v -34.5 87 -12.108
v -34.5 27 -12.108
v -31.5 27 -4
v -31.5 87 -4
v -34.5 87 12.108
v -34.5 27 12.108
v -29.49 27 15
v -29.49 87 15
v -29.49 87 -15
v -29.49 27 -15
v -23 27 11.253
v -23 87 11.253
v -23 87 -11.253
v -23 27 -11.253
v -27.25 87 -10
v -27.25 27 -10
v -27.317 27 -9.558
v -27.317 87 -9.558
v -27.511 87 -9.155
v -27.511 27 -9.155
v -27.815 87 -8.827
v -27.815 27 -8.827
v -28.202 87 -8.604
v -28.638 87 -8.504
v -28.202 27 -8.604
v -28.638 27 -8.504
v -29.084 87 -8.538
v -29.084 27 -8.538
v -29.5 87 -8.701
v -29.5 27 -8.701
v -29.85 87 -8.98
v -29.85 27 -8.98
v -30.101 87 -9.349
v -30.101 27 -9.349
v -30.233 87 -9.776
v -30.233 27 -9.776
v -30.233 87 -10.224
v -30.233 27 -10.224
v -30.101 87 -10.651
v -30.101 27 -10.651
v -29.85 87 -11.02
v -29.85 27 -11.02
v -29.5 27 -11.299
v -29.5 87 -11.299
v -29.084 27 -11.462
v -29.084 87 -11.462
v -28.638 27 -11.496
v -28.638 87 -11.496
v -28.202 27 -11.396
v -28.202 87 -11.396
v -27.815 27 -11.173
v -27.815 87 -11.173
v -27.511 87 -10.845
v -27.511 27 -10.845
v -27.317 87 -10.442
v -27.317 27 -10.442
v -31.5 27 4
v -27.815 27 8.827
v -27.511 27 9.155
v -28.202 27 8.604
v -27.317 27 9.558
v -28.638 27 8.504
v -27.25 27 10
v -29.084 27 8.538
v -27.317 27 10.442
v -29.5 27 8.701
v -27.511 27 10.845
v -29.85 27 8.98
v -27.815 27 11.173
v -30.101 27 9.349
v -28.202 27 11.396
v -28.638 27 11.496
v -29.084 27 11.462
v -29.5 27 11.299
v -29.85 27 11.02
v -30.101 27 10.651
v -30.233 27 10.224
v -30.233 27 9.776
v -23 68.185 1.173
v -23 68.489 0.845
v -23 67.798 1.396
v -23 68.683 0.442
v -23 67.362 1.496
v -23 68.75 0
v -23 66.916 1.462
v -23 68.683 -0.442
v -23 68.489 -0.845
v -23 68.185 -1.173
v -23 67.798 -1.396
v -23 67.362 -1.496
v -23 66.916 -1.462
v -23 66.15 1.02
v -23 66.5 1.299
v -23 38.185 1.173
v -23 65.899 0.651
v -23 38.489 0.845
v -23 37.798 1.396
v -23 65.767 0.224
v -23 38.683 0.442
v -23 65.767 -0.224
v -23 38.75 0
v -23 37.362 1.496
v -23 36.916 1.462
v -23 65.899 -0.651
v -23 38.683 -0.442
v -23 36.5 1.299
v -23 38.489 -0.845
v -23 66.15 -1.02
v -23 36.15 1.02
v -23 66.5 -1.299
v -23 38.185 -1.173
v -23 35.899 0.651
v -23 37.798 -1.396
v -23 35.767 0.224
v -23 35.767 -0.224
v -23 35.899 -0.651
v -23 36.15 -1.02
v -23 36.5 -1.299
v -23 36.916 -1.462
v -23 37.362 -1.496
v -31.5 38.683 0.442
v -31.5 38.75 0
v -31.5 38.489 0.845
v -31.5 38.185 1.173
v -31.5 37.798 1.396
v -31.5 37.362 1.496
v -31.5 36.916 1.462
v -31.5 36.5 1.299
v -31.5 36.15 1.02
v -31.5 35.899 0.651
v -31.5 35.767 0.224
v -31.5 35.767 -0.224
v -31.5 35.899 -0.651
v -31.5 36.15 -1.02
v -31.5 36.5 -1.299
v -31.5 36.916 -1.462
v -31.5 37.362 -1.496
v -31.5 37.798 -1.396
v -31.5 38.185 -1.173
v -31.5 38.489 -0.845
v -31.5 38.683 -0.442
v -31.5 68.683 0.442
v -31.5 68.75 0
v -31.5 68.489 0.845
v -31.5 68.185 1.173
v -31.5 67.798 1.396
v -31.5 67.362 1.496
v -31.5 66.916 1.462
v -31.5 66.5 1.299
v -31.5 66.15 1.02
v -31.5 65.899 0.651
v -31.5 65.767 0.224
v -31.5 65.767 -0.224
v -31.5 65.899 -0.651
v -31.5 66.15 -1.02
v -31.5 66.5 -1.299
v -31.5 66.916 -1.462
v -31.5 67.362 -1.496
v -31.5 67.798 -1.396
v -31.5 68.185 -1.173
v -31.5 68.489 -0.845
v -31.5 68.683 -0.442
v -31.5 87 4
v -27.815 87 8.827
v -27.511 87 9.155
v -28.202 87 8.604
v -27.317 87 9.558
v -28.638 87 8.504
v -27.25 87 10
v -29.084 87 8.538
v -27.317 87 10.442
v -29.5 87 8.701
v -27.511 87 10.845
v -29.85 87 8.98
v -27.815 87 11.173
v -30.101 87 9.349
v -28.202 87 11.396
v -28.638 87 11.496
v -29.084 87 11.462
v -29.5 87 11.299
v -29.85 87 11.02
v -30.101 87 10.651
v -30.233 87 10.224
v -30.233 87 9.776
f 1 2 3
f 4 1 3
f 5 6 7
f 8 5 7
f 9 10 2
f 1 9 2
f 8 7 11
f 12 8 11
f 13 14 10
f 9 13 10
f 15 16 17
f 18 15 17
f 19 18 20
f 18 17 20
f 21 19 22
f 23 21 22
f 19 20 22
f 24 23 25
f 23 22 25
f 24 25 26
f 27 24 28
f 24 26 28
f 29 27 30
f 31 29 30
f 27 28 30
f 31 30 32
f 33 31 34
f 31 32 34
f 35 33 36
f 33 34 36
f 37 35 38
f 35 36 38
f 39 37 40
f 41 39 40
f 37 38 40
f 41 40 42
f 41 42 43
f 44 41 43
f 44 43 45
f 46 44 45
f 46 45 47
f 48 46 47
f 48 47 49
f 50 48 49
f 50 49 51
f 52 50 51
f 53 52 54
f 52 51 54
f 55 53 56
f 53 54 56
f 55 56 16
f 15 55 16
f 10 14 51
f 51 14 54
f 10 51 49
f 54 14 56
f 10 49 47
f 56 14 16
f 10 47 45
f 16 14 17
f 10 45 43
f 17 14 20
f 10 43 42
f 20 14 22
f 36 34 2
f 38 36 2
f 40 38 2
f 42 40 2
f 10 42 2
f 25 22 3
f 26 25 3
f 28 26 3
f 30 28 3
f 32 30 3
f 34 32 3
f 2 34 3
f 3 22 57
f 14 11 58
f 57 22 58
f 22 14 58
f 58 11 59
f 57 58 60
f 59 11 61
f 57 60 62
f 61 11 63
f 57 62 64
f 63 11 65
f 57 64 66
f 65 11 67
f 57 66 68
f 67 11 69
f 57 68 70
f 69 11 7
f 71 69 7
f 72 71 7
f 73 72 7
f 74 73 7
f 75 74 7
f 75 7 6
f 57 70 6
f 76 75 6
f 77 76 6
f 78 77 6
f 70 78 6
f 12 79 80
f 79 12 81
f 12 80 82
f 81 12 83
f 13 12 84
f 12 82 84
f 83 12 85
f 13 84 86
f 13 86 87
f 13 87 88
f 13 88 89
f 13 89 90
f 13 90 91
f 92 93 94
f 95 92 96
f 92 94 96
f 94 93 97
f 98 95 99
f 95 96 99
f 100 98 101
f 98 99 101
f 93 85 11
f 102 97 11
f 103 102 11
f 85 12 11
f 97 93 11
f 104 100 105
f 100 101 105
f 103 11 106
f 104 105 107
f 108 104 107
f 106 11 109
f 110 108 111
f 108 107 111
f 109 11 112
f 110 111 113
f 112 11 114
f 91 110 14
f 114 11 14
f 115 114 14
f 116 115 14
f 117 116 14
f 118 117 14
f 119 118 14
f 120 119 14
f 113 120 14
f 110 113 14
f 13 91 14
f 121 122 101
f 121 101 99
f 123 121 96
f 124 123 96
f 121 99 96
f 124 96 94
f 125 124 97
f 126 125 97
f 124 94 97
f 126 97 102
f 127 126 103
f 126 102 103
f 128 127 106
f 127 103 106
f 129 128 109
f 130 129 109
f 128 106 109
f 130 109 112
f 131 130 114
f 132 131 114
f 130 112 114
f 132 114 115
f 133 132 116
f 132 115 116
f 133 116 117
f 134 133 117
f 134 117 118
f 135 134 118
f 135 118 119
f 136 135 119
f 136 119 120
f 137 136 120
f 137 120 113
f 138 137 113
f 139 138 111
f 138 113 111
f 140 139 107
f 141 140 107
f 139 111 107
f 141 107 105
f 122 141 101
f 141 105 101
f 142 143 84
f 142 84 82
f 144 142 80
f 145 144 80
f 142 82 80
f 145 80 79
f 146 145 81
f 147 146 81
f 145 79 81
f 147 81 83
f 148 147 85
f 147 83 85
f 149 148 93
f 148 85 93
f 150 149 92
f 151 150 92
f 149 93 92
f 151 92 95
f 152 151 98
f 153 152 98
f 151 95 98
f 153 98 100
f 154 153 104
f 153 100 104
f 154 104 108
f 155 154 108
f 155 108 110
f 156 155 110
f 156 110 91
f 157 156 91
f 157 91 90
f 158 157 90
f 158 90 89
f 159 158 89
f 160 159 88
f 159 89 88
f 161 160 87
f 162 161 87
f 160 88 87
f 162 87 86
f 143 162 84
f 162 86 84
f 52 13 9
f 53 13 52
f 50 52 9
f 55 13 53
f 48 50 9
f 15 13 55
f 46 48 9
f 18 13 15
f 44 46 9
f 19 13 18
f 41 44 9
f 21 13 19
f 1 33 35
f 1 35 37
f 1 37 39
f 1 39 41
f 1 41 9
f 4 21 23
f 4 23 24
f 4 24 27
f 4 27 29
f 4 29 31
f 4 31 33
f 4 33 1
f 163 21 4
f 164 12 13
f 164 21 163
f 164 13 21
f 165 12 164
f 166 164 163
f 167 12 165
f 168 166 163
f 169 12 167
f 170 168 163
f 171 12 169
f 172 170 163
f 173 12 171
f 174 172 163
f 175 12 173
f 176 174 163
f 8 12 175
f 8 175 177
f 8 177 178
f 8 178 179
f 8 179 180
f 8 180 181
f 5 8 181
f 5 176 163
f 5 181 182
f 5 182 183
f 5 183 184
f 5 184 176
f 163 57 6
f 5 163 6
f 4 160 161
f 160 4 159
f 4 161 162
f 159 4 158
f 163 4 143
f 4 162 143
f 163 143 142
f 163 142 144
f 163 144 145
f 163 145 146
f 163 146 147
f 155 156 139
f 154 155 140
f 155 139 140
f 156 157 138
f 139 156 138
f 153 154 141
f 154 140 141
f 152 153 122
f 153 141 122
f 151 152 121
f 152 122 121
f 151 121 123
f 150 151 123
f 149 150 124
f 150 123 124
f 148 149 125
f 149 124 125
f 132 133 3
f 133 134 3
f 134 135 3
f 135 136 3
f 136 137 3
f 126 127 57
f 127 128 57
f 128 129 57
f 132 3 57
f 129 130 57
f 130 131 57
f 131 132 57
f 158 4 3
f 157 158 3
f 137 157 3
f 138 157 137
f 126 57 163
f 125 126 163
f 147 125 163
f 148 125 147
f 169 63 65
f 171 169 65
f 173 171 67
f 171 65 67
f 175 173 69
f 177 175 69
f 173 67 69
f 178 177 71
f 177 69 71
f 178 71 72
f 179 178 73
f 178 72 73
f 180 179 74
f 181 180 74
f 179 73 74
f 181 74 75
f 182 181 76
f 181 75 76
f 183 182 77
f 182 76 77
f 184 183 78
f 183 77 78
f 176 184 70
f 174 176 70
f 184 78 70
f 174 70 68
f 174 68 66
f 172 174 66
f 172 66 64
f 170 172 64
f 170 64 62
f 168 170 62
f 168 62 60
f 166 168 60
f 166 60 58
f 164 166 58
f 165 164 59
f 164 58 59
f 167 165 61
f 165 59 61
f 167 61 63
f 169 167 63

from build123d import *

# Parameters (mm, degrees)
SKETCH135_R  = 1.5
PAD107_DEPTH = 50
SKETCH138_R  = 1.5
PAD111_DEPTH = 50
SKETCH098_R  = 1.5
PAD075_DEPTH = 60


with BuildPart() as screwcutout:
    # Sketch135 → Pad107 (new body, symmetric)
    with BuildSketch(Plane(origin=(0, 34, 0), x_dir=(0, 1, 0), z_dir=(1, 0, 0))):
        with Locations((3.25, 0)):
            Circle(SKETCH135_R)
    extrude(amount=PAD107_DEPTH, both=True)


with BuildPart() as sidecutouts:
    # Sketch138 → Pad111 (new body, symmetric)
    with BuildSketch(Plane(origin=(0, 70, 0), x_dir=(0, 1, 0), z_dir=(1, 0, 0))):
        with Locations((-2.75, 0)):
            Circle(SKETCH138_R)
    extrude(amount=PAD111_DEPTH, both=True)

    # Fusion004020008: union ScrewCutout
    add(screwcutout.part)


with BuildPart() as sidewall:
    # Sketch098 → Pad075 (new body)
    with BuildSketch(Plane.XZ.offset(-27)):
        Polygon((-31.5, -4), (-31.5, 4), (-34.5, 12.107695), (-29.490381, 15), (-23, 11.252777), (-23, -11.252777), (-29.490381, -15), (-34.5, -12.107695), align=None)
        with Locations((-28.75, 10)):
            Circle(SKETCH098_R, mode=Mode.SUBTRACT)
        with Locations((-28.75, -10)):
            Circle(SKETCH098_R, mode=Mode.SUBTRACT)
    extrude(amount=-PAD075_DEPTH)

    # Cut007019013: cut sideCutouts
    add(sidecutouts.part, mode=Mode.SUBTRACT)


solid = sidewall.part
